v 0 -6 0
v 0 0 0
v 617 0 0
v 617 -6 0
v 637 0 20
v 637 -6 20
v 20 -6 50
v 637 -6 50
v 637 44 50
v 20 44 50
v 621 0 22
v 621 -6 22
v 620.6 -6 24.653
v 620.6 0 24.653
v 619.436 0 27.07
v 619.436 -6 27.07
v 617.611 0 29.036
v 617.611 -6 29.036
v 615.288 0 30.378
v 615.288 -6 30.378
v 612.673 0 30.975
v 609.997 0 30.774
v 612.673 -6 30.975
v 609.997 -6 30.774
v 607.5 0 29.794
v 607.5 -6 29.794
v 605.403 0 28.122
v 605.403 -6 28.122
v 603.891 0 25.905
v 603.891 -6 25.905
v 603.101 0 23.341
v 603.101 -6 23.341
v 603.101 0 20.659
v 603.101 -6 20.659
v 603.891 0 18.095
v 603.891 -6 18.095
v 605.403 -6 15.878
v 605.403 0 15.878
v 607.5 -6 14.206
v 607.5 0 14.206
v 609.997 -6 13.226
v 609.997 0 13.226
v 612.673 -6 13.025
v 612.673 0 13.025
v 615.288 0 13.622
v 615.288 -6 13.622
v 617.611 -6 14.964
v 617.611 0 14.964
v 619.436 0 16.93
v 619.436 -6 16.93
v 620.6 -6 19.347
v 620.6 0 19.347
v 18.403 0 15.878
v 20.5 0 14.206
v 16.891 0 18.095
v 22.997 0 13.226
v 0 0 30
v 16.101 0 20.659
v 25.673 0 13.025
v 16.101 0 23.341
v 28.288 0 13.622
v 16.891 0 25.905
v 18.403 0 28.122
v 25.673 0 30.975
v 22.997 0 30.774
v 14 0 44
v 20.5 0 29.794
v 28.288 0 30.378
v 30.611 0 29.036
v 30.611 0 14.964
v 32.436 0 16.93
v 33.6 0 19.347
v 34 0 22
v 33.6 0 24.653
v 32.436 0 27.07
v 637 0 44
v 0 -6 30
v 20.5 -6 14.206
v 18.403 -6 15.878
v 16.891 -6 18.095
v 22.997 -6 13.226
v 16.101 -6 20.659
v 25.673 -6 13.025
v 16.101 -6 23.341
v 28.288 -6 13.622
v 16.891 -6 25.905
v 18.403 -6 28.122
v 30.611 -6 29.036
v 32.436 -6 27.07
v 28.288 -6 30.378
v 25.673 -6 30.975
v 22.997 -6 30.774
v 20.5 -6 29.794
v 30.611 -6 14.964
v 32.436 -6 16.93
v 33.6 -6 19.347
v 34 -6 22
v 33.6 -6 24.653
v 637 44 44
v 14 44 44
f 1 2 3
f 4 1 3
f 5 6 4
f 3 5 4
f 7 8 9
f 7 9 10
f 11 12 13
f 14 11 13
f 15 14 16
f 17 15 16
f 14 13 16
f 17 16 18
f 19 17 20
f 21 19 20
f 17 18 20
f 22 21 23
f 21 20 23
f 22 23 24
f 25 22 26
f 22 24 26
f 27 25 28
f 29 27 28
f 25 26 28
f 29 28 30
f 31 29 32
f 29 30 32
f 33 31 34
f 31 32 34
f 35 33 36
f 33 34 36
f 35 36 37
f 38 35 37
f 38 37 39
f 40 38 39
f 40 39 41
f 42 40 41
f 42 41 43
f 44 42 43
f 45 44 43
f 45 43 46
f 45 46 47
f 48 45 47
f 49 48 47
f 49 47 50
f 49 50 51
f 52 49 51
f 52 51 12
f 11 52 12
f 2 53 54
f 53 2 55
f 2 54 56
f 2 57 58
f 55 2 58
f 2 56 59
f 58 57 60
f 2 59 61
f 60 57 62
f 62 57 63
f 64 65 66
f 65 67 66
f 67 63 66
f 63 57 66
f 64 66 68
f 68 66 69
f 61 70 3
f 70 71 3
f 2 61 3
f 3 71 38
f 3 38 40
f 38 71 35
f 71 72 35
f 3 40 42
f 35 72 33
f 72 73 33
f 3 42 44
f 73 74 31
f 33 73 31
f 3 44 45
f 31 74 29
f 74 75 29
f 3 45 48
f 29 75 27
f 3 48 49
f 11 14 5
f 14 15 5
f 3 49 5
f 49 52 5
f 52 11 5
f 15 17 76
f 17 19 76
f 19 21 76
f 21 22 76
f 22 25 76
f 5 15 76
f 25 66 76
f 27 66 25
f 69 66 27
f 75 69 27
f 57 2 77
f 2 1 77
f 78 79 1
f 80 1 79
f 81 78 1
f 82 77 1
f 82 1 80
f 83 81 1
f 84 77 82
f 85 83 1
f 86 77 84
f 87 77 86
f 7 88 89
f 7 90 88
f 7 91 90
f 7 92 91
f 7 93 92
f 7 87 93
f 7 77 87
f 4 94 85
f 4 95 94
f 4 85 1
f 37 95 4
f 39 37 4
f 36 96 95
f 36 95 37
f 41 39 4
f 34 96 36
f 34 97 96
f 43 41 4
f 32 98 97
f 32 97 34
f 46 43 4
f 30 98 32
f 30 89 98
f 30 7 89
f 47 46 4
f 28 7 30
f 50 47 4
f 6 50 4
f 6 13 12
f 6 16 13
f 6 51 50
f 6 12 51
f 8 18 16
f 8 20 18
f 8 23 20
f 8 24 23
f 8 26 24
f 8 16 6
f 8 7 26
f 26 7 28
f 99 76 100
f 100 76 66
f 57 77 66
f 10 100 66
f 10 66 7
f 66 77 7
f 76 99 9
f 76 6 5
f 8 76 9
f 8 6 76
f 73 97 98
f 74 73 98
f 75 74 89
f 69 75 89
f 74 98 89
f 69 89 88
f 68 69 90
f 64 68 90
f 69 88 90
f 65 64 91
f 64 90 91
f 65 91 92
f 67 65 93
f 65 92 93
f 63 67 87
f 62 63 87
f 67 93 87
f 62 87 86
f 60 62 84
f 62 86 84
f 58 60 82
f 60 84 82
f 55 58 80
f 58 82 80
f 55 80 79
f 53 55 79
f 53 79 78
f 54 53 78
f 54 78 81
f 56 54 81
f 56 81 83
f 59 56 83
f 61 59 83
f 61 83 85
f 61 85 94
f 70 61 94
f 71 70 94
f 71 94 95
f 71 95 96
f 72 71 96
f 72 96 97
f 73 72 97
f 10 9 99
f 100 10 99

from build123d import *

# Parameters (mm, degrees)
F0_W     = 637
F0_H     = 50
F1_DEPTH = 6
F2_W     = 637
F2_H     = 6
F3_DEPTH = 44
F4_R     = 9
F5_DEPTH = 25
F7_DEPTH = 50


with BuildPart() as f1:
    # F0 (on Front) → F1 (new body)
    with BuildSketch(Plane.XZ):
        with Locations((318.5, 25)):
            Rectangle(F0_W, F0_H)
    extrude(amount=F1_DEPTH)

    # F2 (on face) → F3 (join)
    with BuildSketch(Plane(origin=(0, 0, 0), x_dir=(-1, 0, 0), z_dir=(0, 1, 0))):
        with Locations((-318.5, 47)):
            Rectangle(F2_W, F2_H)
    extrude(amount=F3_DEPTH)

    # F4 (on face) → F5 (cut)
    with BuildSketch(Plane.XZ.offset(6)):
        with Locations((25, 22)):
            Circle(F4_R)
        with Locations((612, 22)):
            Circle(F4_R)
    extrude(amount=-F5_DEPTH, mode=Mode.SUBTRACT)

    # F6 (on face) → F7 (cut)
    with BuildSketch(Plane.XZ.offset(6)):
        Polygon((637, 20), (617, 0), (637, 0), align=None)
        Polygon((0, 50), (0, 30), (20, 50), align=None)
    extrude(amount=-F7_DEPTH, mode=Mode.SUBTRACT)


solid = f1.part
